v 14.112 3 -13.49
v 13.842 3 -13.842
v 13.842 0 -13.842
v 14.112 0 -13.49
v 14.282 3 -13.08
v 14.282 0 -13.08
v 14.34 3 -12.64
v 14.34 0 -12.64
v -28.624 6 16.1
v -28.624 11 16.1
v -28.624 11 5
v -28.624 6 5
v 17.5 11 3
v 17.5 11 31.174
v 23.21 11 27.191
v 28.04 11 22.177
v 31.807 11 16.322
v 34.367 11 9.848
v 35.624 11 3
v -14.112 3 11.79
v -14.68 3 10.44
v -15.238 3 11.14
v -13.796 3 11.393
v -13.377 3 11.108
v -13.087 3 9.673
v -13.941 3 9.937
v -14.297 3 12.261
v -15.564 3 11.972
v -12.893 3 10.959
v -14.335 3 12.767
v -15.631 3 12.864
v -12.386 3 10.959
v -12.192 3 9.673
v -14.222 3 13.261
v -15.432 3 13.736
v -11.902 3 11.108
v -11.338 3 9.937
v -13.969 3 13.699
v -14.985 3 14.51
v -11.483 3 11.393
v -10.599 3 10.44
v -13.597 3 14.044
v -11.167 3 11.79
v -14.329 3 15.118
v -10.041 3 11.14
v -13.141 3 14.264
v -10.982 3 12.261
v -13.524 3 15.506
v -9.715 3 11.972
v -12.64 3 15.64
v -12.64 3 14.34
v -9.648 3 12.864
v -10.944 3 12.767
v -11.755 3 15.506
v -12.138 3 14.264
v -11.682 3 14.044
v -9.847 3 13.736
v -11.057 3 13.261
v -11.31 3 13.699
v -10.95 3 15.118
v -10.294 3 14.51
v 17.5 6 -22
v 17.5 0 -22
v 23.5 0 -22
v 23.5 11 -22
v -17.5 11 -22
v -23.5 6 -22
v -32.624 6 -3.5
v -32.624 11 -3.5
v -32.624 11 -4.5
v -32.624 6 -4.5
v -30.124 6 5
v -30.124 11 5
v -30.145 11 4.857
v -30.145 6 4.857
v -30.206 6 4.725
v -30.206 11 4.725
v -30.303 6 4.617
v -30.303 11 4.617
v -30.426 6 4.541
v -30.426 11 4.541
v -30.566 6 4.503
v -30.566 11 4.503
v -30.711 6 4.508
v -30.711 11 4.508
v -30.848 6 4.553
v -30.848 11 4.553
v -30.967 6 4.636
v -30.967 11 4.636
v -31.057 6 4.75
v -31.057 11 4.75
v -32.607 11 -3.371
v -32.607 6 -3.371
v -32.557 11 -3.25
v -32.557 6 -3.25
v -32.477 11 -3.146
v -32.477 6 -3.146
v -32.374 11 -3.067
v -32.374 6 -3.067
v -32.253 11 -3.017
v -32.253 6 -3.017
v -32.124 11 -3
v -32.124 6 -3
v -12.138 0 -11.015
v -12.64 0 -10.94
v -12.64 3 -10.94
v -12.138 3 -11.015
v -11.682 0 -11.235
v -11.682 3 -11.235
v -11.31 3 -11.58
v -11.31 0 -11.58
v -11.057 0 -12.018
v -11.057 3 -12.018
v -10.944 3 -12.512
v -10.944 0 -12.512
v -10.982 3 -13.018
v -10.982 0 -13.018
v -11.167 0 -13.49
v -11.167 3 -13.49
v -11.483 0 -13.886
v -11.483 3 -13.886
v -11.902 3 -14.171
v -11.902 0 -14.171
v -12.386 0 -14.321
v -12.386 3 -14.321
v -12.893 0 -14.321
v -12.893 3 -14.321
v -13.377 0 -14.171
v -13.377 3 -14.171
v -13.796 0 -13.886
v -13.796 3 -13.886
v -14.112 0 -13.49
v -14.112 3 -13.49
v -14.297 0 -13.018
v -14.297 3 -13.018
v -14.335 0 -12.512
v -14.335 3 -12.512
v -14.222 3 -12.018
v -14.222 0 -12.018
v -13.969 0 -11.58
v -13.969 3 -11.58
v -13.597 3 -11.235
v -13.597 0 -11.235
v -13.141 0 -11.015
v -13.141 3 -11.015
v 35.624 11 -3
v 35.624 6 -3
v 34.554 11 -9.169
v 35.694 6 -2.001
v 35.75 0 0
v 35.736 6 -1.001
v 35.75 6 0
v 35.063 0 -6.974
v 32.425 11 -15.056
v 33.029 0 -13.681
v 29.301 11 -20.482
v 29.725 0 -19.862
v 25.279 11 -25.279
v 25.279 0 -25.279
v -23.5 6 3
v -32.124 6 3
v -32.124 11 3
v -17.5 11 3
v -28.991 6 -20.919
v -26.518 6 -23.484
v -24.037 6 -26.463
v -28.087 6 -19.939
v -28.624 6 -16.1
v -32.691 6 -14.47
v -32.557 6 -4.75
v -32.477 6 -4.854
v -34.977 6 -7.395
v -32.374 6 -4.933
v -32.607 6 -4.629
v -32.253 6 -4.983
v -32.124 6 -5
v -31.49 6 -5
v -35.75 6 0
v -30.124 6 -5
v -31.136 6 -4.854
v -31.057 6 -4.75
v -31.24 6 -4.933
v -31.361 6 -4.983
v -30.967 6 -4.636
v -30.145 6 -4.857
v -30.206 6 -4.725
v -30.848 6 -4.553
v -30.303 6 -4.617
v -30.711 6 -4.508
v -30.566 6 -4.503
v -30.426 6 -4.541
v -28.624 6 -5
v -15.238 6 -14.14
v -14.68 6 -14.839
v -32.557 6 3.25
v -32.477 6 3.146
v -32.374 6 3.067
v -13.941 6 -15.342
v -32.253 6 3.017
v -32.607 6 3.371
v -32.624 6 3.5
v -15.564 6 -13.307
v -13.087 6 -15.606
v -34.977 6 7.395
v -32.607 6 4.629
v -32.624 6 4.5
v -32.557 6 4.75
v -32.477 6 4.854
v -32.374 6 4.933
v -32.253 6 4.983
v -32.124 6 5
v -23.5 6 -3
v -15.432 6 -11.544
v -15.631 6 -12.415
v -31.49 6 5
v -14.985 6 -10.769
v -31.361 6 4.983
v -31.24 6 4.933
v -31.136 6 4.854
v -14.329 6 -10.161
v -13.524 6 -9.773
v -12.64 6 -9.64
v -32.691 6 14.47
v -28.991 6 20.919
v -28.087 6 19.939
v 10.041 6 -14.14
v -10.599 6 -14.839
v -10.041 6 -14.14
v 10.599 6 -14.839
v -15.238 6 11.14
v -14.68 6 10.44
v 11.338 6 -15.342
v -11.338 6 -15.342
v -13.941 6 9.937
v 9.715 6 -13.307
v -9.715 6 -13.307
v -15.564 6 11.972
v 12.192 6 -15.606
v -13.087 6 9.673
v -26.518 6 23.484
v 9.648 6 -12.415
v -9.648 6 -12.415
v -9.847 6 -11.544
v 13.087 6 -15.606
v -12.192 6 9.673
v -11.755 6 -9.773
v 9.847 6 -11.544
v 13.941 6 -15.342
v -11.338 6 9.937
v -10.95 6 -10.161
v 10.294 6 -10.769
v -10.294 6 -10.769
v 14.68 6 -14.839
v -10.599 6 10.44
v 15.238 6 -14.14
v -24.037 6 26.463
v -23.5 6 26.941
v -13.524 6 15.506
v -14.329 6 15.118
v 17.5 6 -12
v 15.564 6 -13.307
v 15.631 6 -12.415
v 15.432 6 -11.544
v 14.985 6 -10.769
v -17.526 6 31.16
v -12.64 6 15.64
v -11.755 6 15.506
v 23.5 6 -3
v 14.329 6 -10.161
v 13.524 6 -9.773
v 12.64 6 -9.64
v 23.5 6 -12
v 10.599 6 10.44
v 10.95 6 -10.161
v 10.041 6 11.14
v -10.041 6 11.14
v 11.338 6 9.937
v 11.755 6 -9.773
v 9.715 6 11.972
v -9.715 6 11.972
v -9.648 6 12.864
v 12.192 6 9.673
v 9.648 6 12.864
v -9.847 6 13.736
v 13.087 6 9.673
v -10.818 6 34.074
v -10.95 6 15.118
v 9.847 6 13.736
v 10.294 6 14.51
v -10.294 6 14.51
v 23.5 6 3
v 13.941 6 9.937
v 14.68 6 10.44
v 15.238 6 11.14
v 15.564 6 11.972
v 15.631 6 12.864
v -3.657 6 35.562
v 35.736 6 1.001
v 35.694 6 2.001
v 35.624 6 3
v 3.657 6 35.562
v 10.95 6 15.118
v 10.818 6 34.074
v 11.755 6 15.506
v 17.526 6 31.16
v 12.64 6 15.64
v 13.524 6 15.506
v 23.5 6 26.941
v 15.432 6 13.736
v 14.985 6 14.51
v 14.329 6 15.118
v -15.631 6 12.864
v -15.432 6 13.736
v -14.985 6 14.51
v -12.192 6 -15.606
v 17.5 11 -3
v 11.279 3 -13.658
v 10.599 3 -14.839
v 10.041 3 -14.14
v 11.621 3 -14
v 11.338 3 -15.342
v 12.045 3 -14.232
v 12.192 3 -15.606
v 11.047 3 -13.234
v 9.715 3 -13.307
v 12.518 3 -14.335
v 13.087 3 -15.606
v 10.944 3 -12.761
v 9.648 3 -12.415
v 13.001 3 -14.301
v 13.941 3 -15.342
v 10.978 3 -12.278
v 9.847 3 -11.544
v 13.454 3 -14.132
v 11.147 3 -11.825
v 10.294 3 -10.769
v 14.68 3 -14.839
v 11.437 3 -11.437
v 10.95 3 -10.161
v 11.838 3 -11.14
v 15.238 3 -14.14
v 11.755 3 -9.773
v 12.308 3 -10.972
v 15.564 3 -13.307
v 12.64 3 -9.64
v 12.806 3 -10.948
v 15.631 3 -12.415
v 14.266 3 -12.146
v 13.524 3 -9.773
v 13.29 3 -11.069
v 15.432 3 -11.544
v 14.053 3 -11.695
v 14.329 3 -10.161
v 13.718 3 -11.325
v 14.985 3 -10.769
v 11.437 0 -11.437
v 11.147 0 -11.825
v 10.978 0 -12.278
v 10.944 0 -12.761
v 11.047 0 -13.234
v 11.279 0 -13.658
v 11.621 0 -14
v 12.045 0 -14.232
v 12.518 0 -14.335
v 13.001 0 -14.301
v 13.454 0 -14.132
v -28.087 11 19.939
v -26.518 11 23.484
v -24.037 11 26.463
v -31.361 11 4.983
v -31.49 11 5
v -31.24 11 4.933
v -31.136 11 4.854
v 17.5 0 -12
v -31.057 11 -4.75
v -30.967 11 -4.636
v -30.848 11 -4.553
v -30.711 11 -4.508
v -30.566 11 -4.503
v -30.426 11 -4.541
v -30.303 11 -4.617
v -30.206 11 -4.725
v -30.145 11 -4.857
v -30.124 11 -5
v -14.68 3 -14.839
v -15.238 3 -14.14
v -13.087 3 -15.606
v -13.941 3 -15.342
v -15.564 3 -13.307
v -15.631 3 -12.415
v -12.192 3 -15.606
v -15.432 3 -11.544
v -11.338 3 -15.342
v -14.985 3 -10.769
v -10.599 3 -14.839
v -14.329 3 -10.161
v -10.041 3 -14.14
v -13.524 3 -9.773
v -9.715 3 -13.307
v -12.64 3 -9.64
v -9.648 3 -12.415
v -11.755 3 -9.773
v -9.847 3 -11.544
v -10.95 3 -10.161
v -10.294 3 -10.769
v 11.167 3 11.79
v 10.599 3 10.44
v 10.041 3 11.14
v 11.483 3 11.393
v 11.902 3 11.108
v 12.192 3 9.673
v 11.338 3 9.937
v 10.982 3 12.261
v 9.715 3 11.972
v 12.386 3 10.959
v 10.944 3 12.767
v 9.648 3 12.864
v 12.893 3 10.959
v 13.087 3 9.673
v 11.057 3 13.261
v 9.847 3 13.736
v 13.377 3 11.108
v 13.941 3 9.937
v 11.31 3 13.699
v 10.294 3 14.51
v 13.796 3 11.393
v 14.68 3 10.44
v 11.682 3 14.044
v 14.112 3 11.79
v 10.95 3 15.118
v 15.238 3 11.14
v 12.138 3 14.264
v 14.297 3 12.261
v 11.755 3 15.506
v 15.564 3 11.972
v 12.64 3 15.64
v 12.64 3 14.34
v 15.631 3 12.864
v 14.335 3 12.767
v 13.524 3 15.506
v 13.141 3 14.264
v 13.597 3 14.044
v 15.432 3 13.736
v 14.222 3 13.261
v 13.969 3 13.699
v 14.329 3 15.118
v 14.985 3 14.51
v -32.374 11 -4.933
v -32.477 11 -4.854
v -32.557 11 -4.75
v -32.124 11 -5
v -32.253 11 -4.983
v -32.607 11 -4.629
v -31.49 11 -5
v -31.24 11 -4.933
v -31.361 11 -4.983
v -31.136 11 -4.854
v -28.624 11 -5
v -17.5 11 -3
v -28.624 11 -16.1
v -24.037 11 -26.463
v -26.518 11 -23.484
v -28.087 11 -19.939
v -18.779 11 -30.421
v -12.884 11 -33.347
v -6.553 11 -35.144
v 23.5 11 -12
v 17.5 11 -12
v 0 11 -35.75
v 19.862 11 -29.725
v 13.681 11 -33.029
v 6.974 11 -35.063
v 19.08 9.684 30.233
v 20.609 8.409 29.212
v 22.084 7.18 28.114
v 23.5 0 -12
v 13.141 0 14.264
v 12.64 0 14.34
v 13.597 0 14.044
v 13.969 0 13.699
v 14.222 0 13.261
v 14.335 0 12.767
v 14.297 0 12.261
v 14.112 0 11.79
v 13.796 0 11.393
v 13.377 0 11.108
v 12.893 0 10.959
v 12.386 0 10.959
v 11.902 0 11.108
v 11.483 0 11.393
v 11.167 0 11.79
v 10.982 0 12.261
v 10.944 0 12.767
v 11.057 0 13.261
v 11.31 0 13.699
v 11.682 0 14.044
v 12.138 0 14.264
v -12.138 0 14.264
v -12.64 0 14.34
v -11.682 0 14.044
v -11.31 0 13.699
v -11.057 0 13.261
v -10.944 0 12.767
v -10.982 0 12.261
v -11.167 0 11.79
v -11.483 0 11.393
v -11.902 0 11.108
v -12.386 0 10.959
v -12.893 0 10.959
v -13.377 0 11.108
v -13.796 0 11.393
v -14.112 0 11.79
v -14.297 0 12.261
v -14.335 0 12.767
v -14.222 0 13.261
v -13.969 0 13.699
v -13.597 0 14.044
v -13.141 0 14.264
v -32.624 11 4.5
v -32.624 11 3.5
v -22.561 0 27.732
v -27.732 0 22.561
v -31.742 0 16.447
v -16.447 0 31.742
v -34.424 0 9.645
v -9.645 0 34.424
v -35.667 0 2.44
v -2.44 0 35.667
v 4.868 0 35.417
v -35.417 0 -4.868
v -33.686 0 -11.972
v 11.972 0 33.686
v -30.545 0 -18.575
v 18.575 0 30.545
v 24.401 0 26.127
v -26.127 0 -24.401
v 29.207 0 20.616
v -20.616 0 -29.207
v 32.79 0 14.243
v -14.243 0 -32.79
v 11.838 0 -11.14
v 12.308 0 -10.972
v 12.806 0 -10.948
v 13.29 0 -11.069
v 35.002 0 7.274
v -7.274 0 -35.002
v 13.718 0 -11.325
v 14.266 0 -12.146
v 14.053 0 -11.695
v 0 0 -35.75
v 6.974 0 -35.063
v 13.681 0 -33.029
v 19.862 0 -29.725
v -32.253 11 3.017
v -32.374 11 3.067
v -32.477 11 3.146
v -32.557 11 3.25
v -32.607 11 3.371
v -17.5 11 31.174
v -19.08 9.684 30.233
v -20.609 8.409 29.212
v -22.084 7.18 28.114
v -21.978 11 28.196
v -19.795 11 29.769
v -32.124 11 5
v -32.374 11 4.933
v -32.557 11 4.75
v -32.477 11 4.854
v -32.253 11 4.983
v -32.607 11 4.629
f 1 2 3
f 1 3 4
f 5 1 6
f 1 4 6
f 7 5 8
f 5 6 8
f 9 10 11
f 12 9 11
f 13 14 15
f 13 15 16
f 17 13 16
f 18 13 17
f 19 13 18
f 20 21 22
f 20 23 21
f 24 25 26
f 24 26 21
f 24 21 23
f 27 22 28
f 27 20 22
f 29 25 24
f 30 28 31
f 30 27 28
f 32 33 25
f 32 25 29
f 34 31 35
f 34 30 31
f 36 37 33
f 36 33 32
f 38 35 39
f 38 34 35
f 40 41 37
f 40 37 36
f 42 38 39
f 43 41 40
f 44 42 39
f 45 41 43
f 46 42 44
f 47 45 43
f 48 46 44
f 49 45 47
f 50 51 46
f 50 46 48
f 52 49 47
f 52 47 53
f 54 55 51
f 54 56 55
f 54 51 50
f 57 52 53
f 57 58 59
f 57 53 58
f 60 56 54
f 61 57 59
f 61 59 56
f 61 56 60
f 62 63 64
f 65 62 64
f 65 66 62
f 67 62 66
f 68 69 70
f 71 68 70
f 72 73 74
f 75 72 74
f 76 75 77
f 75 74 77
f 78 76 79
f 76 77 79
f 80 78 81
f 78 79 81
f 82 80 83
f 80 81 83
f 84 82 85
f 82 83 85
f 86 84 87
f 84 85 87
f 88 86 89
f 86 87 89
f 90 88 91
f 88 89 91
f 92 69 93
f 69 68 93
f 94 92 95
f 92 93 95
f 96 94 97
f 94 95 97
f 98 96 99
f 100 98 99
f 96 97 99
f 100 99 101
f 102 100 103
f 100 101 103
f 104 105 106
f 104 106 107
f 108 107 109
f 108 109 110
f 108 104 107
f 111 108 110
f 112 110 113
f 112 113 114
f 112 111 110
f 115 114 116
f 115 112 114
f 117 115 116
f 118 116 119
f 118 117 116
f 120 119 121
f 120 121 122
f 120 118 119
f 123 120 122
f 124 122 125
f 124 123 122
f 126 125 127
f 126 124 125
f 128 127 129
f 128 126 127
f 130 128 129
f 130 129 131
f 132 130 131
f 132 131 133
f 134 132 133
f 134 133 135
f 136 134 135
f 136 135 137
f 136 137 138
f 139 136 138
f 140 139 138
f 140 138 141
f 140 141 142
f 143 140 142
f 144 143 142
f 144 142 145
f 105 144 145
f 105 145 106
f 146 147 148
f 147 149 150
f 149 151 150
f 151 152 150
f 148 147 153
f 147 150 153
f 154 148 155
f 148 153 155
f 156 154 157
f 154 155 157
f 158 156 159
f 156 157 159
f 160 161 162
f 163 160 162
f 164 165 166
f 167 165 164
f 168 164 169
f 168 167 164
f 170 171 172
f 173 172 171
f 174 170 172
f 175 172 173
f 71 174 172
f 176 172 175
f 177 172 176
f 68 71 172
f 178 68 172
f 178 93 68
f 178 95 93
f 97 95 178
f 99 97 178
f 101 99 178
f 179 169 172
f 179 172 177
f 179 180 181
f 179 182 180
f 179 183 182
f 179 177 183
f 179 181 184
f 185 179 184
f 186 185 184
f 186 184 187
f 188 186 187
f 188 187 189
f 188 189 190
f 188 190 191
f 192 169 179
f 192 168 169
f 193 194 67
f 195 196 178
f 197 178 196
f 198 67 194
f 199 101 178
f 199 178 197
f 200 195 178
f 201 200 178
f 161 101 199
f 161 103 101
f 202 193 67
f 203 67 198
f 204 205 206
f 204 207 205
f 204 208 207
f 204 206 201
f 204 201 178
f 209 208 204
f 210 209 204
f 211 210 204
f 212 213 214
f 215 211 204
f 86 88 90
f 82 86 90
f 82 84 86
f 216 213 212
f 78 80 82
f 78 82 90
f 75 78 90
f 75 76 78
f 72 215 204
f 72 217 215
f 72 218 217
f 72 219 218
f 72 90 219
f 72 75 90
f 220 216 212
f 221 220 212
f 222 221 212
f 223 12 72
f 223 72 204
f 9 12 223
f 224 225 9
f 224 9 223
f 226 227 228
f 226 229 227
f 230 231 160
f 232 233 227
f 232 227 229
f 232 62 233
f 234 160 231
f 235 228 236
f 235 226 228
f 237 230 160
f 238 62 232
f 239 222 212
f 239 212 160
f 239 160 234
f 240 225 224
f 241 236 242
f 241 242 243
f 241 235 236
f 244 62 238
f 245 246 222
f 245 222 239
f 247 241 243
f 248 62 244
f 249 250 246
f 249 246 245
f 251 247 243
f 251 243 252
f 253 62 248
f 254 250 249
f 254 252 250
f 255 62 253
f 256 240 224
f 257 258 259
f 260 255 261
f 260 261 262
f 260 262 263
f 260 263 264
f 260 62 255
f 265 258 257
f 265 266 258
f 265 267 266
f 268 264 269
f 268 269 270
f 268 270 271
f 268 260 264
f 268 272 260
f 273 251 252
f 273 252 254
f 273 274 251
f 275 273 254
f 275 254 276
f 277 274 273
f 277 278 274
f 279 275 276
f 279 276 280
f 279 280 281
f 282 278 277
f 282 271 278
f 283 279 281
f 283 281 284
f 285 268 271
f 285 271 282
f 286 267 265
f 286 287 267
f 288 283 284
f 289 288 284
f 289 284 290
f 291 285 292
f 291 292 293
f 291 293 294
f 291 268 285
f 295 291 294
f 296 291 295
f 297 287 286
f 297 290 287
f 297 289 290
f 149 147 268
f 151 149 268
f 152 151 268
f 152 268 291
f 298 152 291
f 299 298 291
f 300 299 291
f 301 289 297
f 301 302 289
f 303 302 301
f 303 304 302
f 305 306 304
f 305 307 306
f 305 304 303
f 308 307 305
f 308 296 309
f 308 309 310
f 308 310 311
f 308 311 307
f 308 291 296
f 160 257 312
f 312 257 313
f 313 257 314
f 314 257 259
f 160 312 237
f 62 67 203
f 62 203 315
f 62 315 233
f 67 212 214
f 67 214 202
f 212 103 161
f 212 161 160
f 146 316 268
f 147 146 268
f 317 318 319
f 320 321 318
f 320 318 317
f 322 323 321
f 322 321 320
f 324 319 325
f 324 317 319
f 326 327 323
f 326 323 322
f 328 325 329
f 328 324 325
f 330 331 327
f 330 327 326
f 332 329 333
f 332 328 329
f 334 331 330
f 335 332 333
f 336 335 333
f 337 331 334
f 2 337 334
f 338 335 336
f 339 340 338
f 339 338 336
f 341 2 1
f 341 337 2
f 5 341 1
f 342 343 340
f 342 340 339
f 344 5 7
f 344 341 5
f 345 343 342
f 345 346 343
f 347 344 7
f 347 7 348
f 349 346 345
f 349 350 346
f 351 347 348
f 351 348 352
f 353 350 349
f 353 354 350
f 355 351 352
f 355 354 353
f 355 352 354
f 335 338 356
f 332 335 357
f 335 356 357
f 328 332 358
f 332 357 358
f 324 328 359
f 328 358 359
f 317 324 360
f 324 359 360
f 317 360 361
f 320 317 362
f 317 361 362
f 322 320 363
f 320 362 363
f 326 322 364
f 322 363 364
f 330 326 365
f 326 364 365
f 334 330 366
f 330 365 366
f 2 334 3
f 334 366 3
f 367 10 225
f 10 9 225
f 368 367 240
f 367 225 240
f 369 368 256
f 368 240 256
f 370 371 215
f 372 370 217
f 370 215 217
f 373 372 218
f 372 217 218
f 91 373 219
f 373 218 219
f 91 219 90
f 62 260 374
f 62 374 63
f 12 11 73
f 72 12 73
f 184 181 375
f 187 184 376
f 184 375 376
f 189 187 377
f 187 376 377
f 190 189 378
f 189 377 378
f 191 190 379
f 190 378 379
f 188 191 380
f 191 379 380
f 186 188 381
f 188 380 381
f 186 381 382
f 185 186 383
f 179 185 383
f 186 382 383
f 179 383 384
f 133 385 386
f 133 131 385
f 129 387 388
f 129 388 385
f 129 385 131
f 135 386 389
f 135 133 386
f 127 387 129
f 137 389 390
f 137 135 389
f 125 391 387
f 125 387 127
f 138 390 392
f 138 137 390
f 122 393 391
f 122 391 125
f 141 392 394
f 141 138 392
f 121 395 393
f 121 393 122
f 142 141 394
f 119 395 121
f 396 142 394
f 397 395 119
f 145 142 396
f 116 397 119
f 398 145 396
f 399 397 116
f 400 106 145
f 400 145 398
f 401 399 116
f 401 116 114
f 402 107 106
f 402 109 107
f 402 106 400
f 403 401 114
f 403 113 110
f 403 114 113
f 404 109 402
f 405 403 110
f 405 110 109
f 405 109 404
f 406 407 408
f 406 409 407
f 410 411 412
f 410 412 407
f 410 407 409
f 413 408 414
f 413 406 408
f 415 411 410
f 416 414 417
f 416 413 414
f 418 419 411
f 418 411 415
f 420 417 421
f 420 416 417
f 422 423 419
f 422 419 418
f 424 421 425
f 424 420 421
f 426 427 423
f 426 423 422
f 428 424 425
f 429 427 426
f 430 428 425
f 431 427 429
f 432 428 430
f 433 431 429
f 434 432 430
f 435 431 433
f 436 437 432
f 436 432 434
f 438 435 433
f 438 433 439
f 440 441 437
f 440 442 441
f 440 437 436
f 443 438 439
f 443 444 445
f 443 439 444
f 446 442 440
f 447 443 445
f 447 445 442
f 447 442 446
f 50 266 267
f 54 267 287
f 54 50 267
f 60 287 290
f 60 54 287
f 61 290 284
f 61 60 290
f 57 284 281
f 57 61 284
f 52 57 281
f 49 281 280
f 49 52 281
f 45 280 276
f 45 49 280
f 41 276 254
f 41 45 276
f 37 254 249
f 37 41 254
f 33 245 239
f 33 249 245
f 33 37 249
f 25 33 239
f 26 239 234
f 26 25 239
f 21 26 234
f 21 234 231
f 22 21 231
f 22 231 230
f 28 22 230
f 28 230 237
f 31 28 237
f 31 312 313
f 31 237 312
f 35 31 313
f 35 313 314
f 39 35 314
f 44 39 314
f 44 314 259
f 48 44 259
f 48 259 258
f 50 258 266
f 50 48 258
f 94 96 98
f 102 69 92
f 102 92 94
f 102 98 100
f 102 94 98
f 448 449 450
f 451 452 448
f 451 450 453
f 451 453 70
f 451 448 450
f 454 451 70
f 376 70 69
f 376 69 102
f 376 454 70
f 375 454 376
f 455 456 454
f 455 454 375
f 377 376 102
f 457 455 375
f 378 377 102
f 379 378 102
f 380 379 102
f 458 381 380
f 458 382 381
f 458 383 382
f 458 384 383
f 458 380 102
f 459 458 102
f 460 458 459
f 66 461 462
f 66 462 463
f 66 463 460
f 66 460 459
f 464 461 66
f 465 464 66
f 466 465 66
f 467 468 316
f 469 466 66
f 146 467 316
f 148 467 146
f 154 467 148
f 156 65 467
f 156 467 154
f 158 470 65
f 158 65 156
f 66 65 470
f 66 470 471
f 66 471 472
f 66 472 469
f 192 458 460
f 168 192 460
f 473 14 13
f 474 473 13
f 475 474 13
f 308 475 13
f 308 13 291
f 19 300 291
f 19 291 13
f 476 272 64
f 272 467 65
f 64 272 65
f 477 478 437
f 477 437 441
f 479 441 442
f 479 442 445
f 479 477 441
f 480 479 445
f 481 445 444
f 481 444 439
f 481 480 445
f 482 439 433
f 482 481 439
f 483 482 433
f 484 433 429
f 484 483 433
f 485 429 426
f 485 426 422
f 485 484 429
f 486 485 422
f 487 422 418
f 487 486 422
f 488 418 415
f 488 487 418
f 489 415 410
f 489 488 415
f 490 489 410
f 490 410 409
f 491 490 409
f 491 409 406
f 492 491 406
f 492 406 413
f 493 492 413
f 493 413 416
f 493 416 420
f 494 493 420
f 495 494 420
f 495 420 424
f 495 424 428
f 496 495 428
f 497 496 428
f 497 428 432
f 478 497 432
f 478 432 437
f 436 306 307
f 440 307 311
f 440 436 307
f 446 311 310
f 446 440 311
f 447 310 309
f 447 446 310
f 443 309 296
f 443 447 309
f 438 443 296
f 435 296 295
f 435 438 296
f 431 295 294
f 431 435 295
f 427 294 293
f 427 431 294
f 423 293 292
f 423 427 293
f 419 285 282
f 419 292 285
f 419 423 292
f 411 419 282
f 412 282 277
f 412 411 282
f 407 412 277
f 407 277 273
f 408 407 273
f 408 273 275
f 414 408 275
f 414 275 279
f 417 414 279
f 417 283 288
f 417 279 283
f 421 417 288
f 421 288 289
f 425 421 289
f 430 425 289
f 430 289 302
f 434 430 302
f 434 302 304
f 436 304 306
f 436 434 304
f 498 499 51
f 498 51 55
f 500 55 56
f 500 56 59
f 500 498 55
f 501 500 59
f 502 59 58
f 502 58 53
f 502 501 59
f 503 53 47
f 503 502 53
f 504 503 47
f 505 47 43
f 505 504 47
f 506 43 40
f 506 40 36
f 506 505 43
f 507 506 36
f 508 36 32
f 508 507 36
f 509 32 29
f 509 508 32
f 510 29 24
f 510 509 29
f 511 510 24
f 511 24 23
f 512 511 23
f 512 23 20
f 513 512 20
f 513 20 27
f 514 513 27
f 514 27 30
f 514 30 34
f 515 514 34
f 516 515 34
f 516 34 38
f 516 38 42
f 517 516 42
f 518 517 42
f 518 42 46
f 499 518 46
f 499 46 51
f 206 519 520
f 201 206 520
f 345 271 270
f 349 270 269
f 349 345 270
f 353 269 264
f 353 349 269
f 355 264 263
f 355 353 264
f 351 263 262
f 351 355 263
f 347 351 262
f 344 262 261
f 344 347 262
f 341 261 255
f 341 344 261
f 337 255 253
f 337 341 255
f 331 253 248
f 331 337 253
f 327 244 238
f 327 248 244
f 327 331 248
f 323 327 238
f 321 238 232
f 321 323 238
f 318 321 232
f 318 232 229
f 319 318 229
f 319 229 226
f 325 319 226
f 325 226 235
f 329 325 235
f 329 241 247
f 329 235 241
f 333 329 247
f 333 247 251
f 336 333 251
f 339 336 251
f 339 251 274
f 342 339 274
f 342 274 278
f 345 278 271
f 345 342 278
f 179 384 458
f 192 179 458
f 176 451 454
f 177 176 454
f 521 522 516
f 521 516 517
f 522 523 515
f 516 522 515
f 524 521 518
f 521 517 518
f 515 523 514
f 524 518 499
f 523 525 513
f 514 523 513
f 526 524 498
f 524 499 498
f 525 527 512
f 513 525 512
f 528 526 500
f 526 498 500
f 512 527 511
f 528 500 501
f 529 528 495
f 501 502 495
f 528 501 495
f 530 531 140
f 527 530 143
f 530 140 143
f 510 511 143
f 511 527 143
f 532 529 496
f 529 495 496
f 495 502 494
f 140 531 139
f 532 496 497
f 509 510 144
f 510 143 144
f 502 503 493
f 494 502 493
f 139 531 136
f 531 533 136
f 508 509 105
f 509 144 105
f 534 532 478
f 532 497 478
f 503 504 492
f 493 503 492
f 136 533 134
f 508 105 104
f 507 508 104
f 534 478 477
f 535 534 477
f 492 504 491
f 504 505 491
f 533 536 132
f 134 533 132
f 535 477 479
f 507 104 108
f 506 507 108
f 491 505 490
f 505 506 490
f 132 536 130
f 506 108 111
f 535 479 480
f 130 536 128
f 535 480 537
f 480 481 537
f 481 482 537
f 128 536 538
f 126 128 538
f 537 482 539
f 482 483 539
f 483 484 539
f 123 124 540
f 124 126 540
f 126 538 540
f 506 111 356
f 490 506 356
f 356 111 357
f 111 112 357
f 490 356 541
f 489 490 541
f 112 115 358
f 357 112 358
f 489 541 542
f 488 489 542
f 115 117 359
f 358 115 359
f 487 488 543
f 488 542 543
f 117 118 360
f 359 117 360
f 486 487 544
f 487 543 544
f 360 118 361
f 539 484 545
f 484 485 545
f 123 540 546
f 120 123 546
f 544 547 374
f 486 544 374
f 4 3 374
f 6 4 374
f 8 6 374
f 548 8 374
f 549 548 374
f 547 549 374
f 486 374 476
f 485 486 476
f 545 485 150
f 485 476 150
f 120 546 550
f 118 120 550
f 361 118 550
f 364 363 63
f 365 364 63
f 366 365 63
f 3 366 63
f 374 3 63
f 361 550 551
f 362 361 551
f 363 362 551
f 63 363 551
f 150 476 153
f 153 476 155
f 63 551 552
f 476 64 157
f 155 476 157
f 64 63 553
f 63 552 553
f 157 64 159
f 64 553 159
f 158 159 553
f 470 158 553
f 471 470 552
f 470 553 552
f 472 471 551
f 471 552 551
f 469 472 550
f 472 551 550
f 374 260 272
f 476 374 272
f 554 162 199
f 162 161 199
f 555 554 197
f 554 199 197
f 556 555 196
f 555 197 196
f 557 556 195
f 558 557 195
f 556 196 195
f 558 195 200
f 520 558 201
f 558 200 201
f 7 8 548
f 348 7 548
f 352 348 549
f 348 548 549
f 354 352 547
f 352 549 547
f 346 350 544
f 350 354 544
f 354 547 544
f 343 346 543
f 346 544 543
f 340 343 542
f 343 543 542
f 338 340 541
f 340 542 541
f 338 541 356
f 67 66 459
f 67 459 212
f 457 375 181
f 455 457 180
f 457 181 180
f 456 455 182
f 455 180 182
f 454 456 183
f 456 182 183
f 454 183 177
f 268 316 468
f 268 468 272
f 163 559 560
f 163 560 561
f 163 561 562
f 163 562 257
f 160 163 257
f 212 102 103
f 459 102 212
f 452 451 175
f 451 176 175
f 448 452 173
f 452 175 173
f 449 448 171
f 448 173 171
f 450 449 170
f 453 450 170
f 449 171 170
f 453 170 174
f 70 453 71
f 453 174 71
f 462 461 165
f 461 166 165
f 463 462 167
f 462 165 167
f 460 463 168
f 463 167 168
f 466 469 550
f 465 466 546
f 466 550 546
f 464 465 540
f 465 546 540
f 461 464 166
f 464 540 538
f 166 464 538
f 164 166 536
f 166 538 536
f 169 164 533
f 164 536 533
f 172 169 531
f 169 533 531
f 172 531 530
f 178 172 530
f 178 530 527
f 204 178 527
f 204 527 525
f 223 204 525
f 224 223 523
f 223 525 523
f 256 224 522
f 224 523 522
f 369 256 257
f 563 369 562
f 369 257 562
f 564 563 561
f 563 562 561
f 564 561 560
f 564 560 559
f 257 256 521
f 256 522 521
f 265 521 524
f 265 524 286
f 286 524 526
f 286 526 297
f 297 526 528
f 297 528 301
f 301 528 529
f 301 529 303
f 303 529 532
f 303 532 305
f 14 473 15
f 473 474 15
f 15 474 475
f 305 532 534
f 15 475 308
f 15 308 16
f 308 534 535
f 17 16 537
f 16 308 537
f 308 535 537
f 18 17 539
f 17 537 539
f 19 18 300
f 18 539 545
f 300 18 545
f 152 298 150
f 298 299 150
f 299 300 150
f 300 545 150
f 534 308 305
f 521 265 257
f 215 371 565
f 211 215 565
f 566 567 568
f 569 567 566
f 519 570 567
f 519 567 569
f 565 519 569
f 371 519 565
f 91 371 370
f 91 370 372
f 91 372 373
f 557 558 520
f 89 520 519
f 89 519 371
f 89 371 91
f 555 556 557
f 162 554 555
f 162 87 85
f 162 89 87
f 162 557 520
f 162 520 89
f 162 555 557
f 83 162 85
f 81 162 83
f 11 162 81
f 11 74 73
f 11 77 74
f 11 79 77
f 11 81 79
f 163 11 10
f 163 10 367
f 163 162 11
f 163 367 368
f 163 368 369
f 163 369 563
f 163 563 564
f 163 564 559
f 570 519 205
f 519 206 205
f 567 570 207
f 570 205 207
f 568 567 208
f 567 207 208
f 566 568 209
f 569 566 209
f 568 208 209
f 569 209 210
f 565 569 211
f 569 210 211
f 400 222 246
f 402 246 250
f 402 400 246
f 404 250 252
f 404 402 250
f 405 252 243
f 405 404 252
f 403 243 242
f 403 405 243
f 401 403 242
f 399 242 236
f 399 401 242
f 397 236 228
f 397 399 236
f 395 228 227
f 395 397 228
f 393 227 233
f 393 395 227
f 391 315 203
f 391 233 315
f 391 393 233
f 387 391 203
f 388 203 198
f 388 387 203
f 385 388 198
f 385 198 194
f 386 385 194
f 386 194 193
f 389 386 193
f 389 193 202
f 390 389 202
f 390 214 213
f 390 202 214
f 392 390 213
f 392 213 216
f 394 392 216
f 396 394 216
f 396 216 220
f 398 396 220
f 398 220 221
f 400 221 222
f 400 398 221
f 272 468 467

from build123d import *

# Parameters (mm, degrees)
SKETCH1_R                      = 1.7
BOSS_EXTRUDE1_DEPTH            = 11
CUT_EXTRUDE1_START             = -8
SKETCH2_R                      = 3
SKETCH2_R_2                    = 1.7
CUT_EXTRUDE1_DEPTH             = 8
SKETCH3_W                      = 6
SKETCH3_H                      = 10
CUT_EXTRUDE2_DEPTH             = 34
CUT_EXTRUDE3_REACH             = 53.741
SKETCH4_W                      = 35
SKETCH4_H                      = 5
CUT_EXTRUDE3_DIRECTION_2_DEPTH = 44
CUT_EXTRUDE4_DEPTH             = 71.068716272
CUT_EXTRUDE4_DEPTH_BACK        = 71.068716272
CUT_EXTRUDE5_DEPTH             = 5
FILLET3_R                      = 0.5
FILLET4_R                      = 14


with BuildPart() as part:
    # Sketch1 → Boss-Extrude1 (new body)
    # profile 1 of 3: a face of its own
    with BuildSketch(Plane(origin=(0, 0, 0), x_dir=(1, 0, 0), z_dir=(0, 1, 0))):
        with BuildLine():
            Line((35.75, 0), (0, 0))
            Line((0, 0), (0, 35.75))
            ThreePointArc((0, 35.75), (-25.279067427, -25.279067427), (35.75, 0))
        make_face()
        with Locations(Location((-12.639533714, -12.639533714, 0), (0, 0, 270))):
            Circle(SKETCH1_R, mode=Mode.SUBTRACT)
        with Locations(Location((12.639533714, -12.639533714, 0), (0, 0, 270))):
            Circle(SKETCH1_R, mode=Mode.SUBTRACT)
        with Locations(Location((-12.639533714, 12.639533714, 0), (0, 0, 270))):
            Circle(SKETCH1_R, mode=Mode.SUBTRACT)
    # profile 2 of 3: a face of its own
    with BuildSketch(Plane(origin=(0, 0, 0), x_dir=(1, 0, 0), z_dir=(0, 1, 0))):
        with BuildLine():
            Line((0, 35.75), (0, 0))
            Line((0, 0), (11.437452186, 11.437452186))
            ThreePointArc((11.437452186, 11.437452186), (11.437452186, 13.841615242), (13.841615242, 13.841615242))
            Line((13.841615242, 13.841615242), (25.279067427, 25.279067427))
            ThreePointArc((25.279067427, 25.279067427), (13.680932707, 33.028693287), (0, 35.75))
        make_face()
    # profile 3 of 3: a face of its own
    with BuildSketch(Plane(origin=(0, 0, 0), x_dir=(1, 0, 0), z_dir=(0, 1, 0))):
        with BuildLine():
            Line((11.437452186, 11.437452186), (0, 0))
            Line((0, 0), (35.75, 0))
            ThreePointArc((35.75, 0), (33.028693287, 13.680932707), (25.279067427, 25.279067427))
            Line((25.279067427, 25.279067427), (13.841615242, 13.841615242))
            ThreePointArc((13.841615242, 13.841615242), (14.210128919, 13.290095549), (14.339533714, 12.639533714))
            ThreePointArc((14.339533714, 12.639533714), (13.290095549, 11.068938508), (11.437452186, 11.437452186))
        make_face()
    extrude(amount=BOSS_EXTRUDE1_DEPTH)

    # Sketch2 → Cut-Extrude1 (cut)
    # profile 1 of 4: a face of its own
    with BuildSketch(Plane(origin=(0, 11, 0), x_dir=(1, 0, 0), z_dir=(0, 1, 0)).offset(CUT_EXTRUDE1_START)):
        with Locations(Location((-12.639533714, -12.639533714, 0), (0, 0, 270))):
            Circle(SKETCH2_R)
        with Locations(Location((-12.639533714, -12.639533714, 0), (0, 0, 270))):
            Circle(SKETCH2_R_2, mode=Mode.SUBTRACT)
    # profile 2 of 4: a face of its own
    with BuildSketch(Plane(origin=(0, 11, 0), x_dir=(1, 0, 0), z_dir=(0, 1, 0)).offset(CUT_EXTRUDE1_START)):
        with Locations(Location((12.639533714, -12.639533714, 0), (0, 0, 270))):
            Circle(SKETCH2_R)
        with Locations(Location((12.639533714, -12.639533714, 0), (0, 0, 270))):
            Circle(SKETCH2_R_2, mode=Mode.SUBTRACT)
    # profile 3 of 4: a face of its own
    with BuildSketch(Plane(origin=(0, 11, 0), x_dir=(1, 0, 0), z_dir=(0, 1, 0)).offset(CUT_EXTRUDE1_START)):
        with Locations(Location((12.639533714, 12.639533714, 0), (0, 0, 270))):
            Circle(SKETCH2_R)
        with Locations(Location((12.639533714, 12.639533714, 0), (0, 0, 270))):
            Circle(SKETCH2_R_2, mode=Mode.SUBTRACT)
    # profile 4 of 4: a face of its own
    with BuildSketch(Plane(origin=(0, 11, 0), x_dir=(1, 0, 0), z_dir=(0, 1, 0)).offset(CUT_EXTRUDE1_START)):
        with Locations(Location((-12.639533714, 12.639533714, 0), (0, 0, 270))):
            Circle(SKETCH2_R)
        with Locations(Location((-12.639533714, 12.639533714, 0), (0, 0, 270))):
            Circle(SKETCH2_R_2, mode=Mode.SUBTRACT)
    extrude(amount=CUT_EXTRUDE1_DEPTH, mode=Mode.SUBTRACT)

    # Sketch3 → Cut-Extrude2 (cut)
    with BuildSketch(Plane(origin=(0, 11, 0), x_dir=(1, 0, 0), z_dir=(0, 1, 0))):
        with Locations((20.5, 17)):
            Rectangle(SKETCH3_W, SKETCH3_H)
    extrude(amount=-CUT_EXTRUDE2_DEPTH, mode=Mode.SUBTRACT)

    # Cut-Extrude3: up to this face of the body (flat: up to its plane)
    cut_extrude3_end = Plane(part.part.faces().sort_by_distance((20.5, 5.5, -22))[0])
    # Sketch4 → Cut-Extrude3 (cut, up to the picked face)
    with BuildSketch(Plane.XY, mode=Mode.PRIVATE) as cut_extrude3_sk1:
        with Locations((0, 8.5)):
            Rectangle(SKETCH4_W, SKETCH4_H)
    cut_extrude3_tool1 = split(extrude(cut_extrude3_sk1.sketch, amount=-CUT_EXTRUDE3_REACH, mode=Mode.PRIVATE), bisect_by=cut_extrude3_end, keep=Keep.BOTH, mode=Mode.PRIVATE)
    # Sketch4 → Cut-Extrude3 (cut, up to the picked face)
    with BuildSketch(Plane.XY, mode=Mode.PRIVATE) as cut_extrude3_sk2:
        Polygon((-17.5, 6), (-17.5, 11), (-23.5, 6), align=None)
    cut_extrude3_tool2 = split(extrude(cut_extrude3_sk2.sketch, amount=-CUT_EXTRUDE3_REACH, mode=Mode.PRIVATE), bisect_by=cut_extrude3_end, keep=Keep.BOTH, mode=Mode.PRIVATE)
    # Sketch4 → Cut-Extrude3 (cut, up to the picked face)
    with BuildSketch(Plane.XY, mode=Mode.PRIVATE) as cut_extrude3_sk3:
        Polygon((23.5, 6), (17.5, 6), (17.5, 11), align=None)
    cut_extrude3_tool3 = split(extrude(cut_extrude3_sk3.sketch, amount=-CUT_EXTRUDE3_REACH, mode=Mode.PRIVATE), bisect_by=cut_extrude3_end, keep=Keep.BOTH, mode=Mode.PRIVATE)
    add(cut_extrude3_tool1.solids().sort_by(Axis((0, 8.5, 0), (0, 0, -1)))[0], mode=Mode.SUBTRACT)
    add(cut_extrude3_tool2.solids().sort_by(Axis((-19.5, 7.666667, 0), (0, 0, -1)))[0], mode=Mode.SUBTRACT)
    add(cut_extrude3_tool3.solids().sort_by(Axis((19.5, 7.666667, 0), (0, 0, -1)))[0], mode=Mode.SUBTRACT)

    # Sketch4 → Cut-Extrude3 direction 2 (cut)
    with BuildSketch(Plane.XY):
        with Locations((0, 8.5)):
            Rectangle(SKETCH4_W, SKETCH4_H)
        Polygon((-17.5, 6), (-17.5, 11), (-23.5, 6), align=None)
        Polygon((23.5, 6), (17.5, 6), (17.5, 11), align=None)
    extrude(amount=CUT_EXTRUDE3_DIRECTION_2_DEPTH, mode=Mode.SUBTRACT)

    # Sketch5 → Cut-Extrude4 (cut, two sides: drawn at the far end of the back side and taken through both)
    with BuildSketch(Plane.ZY.offset(-23.5).offset(-CUT_EXTRUDE4_DEPTH_BACK)):
        Polygon((-3, 11), (-3, 6), (0, 6), (3, 6), (3, 11), align=None)
    extrude(amount=CUT_EXTRUDE4_DEPTH + CUT_EXTRUDE4_DEPTH_BACK, mode=Mode.SUBTRACT)

    # Sketch6 → Cut-Extrude5 (cut)
    with BuildSketch(Plane(origin=(0, 11, 0), x_dir=(1, 0, 0), z_dir=(0, 1, 0))):
        Polygon((-35.623903492, 21.174718123), (-35.623903492, 3), (-32.623903492, 3), (-32.623903492, 5), (-32.623903492, 21.174718123), align=None)
        with BuildLine():
            Line((-35.623903492, 31.403345095), (-35.623903492, 21.174718123))
            Line((-35.623903492, 21.174718123), (-32.623903492, 21.174718123))
            Line((-32.623903492, 21.174718123), (-32.623903492, 5))
            Line((-32.623903492, 5), (-31.123903492, 5))
            ThreePointArc((-31.123903492, 5), (-30.623903492, 5.5), (-30.123903492, 5))
            Line((-30.123903492, 5), (-28.623903492, 5))
            Line((-28.623903492, 5), (-28.623903492, 18.959009746))
            Line((-28.623903492, 18.959009746), (-28.623903492, 31.403345095))
            Line((-28.623903492, 31.403345095), (-35.623903492, 31.403345095))
        make_face()
        with BuildLine():
            ThreePointArc((-30.123903492, 5), (-30.623903492, 5.5), (-31.123903492, 5))
            Line((-31.123903492, 5), (-30.123903492, 5))
        make_face()
        with BuildLine():
            Line((-30.123903492, 5), (-31.123903492, 5))
            ThreePointArc((-31.123903492, 5), (-30.623903492, 4.5), (-30.123903492, 5))
        make_face()
        with BuildLine():
            Line((-32.623903492, -5), (-32.623903492, -21.174718123))
            Line((-32.623903492, -21.174718123), (-35.623903492, -21.174718123))
            Line((-35.623903492, -21.174718123), (-35.623903492, -31.403345095))
            Line((-35.623903492, -31.403345095), (-28.623903492, -31.403345095))
            Line((-28.623903492, -31.403345095), (-28.623903492, -5))
            Line((-28.623903492, -5), (-30.123903492, -5))
            ThreePointArc((-30.123903492, -5), (-30.623903492, -5.5), (-31.123903492, -5))
            Line((-31.123903492, -5), (-32.623903492, -5))
        make_face()
        Polygon((-35.623903492, -21.174718123), (-32.623903492, -21.174718123), (-32.623903492, -5), (-32.623903492, -3), (-35.623903492, -3), align=None)
        with BuildLine():
            ThreePointArc((-30.123903492, -5), (-30.623903492, -4.5), (-31.123903492, -5))
            Line((-31.123903492, -5), (-30.123903492, -5))
        make_face()
        with BuildLine():
            Line((-30.123903492, -5), (-31.123903492, -5))
            ThreePointArc((-31.123903492, -5), (-30.623903492, -5.5), (-30.123903492, -5))
        make_face()
    extrude(amount=-CUT_EXTRUDE5_DEPTH, mode=Mode.SUBTRACT)

    # Fillet3
    fillet3_edges = [part.edges().sort_by_distance(p)[0] for p in [
        (-31.123903492, 8.5, -5),
        (-32.623903492, 8.5, -5),
        (-32.623903492, 8.5, -3),
        (-31.123903492, 8.5, 5),
        (-32.623903492, 8.5, 5),
        (-32.623903492, 8.5, 3),
    ]]
    fillet(fillet3_edges, radius=FILLET3_R)

    # Fillet4
    fillet4_edges = [part.edges().sort_by_distance(p)[0] for p in [
        (-28.623903492, 8.5, -21.418091626),
        (-28.623903492, 8.5, 21.418091626),
    ]]
    fillet(fillet4_edges, radius=FILLET4_R)


solid = part.part
